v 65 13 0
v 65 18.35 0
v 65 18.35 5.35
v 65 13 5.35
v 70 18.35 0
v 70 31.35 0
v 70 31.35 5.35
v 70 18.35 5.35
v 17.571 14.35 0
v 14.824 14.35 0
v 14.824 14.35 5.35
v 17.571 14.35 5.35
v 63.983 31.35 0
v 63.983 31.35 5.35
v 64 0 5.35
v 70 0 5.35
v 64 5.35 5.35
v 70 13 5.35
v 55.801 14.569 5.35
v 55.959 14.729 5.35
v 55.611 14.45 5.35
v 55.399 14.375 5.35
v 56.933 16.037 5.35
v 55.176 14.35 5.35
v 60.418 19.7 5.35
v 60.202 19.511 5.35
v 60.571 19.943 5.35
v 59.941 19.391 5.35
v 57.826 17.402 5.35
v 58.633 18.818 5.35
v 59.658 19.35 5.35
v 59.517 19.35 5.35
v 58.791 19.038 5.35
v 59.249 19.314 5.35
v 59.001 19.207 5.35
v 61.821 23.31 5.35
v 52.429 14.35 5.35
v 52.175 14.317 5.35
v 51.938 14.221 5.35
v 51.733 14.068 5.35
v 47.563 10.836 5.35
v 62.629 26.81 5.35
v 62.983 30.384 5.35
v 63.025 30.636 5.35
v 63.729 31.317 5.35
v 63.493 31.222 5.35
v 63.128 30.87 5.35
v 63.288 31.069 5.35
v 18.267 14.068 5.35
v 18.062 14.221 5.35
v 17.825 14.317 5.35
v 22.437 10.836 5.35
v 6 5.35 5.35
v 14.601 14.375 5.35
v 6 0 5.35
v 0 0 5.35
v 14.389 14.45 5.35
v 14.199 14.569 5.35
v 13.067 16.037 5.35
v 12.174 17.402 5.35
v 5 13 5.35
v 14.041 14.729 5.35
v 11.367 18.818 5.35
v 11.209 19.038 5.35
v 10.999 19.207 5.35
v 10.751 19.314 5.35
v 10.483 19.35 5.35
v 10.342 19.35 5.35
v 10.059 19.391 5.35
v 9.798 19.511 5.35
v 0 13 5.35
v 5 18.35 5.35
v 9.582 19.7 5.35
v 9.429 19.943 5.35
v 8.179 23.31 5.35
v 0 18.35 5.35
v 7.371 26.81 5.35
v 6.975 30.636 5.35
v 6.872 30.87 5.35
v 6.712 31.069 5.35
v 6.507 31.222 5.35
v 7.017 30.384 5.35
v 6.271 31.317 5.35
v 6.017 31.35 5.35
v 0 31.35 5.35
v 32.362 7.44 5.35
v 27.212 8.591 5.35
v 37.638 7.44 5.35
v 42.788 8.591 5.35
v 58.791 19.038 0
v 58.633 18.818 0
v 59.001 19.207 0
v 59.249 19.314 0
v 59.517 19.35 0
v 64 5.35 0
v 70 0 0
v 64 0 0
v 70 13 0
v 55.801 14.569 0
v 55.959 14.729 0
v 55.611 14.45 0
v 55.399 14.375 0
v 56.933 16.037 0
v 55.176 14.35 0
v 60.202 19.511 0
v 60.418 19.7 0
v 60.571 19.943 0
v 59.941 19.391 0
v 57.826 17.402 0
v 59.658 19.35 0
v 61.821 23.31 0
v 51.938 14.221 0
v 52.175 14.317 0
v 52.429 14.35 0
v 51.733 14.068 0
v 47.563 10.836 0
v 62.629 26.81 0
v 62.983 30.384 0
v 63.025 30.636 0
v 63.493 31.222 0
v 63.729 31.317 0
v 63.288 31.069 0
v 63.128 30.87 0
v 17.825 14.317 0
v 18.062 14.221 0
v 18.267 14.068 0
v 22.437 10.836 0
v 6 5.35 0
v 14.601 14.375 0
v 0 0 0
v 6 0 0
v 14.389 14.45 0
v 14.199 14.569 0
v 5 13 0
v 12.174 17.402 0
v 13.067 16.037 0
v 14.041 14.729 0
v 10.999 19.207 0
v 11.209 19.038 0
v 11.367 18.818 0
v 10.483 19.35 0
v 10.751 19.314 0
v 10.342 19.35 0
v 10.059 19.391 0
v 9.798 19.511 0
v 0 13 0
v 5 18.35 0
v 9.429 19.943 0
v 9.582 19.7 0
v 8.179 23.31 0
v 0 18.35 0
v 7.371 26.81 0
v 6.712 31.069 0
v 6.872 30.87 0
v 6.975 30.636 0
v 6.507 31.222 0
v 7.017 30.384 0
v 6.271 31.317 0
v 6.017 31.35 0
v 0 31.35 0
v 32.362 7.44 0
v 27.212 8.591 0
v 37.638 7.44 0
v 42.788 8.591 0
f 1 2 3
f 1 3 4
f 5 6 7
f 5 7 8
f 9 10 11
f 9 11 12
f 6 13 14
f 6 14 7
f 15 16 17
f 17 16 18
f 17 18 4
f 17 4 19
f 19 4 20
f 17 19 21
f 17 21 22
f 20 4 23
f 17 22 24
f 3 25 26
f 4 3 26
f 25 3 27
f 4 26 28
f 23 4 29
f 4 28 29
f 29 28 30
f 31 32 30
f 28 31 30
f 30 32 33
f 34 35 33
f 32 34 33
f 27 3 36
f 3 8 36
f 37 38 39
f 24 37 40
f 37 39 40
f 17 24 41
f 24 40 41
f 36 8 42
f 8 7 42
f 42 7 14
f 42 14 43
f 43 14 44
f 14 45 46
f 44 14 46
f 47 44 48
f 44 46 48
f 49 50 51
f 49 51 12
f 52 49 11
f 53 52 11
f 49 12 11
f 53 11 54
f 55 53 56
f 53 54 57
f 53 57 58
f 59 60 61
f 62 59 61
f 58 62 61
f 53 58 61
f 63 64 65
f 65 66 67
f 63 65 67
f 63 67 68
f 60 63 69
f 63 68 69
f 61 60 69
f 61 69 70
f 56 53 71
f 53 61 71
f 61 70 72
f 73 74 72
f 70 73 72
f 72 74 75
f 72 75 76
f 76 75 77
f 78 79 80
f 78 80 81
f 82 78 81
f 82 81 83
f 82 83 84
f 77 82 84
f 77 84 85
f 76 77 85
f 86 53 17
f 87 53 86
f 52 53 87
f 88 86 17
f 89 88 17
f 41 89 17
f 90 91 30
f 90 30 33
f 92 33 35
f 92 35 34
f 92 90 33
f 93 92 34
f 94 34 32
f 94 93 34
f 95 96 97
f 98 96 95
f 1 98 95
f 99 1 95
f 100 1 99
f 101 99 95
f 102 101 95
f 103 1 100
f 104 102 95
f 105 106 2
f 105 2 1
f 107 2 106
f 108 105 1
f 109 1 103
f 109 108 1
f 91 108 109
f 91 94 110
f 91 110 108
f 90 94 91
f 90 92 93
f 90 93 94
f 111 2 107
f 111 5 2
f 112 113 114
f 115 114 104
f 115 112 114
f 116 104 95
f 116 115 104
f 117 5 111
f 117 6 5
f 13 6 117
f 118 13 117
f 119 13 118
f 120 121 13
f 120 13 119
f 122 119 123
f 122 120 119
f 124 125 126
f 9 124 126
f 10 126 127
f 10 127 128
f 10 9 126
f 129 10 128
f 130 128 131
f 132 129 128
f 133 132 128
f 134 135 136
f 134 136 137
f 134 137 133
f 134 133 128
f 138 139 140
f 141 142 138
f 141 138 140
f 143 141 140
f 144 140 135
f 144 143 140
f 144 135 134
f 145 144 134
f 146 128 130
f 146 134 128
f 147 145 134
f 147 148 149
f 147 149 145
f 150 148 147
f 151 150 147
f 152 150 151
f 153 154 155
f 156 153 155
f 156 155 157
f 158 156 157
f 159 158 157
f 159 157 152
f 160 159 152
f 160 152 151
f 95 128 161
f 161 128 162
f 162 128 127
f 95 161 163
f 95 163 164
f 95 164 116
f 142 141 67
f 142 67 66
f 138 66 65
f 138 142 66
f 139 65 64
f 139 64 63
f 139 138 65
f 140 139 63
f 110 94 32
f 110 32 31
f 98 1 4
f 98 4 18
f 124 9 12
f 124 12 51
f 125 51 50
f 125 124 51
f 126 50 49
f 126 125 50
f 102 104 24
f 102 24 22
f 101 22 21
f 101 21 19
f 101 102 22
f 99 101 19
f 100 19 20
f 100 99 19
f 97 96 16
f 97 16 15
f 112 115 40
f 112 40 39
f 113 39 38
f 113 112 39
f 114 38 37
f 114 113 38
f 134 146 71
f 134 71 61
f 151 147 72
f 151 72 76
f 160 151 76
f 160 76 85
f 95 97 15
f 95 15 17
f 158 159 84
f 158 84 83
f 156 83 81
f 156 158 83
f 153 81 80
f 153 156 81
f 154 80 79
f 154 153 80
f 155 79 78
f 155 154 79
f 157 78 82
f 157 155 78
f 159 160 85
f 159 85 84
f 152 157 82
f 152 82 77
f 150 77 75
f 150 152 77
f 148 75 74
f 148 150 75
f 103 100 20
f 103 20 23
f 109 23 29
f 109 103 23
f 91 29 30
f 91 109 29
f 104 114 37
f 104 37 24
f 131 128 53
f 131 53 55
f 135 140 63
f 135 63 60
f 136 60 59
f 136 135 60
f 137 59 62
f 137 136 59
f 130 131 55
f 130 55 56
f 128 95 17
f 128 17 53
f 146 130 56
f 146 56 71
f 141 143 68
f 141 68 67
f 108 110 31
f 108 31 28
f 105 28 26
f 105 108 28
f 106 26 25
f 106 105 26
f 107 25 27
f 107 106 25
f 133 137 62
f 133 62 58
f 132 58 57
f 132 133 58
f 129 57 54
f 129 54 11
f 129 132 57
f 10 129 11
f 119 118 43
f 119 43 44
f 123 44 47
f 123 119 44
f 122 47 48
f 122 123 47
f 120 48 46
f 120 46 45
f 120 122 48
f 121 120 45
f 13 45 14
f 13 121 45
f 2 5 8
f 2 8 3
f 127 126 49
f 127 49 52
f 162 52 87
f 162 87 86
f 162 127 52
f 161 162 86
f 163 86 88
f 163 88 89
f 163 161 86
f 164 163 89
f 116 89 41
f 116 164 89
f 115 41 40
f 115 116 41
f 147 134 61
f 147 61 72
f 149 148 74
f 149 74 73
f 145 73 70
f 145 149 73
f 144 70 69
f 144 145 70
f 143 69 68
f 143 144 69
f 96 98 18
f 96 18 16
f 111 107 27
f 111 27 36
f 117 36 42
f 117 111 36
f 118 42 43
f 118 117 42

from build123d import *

# Parameters (mm, degrees)
BOSS_EXTRUDE1_DEPTH = 5.35


with BuildPart() as part:
    # Model → Boss-Extrude1 (new body)
    with BuildSketch(Plane.XY):
        with BuildLine():
            Line((10.342343988, 19.35), (10.483423975, 19.35))
            ThreePointArc((10.483423975, 19.35), (10.998948723, 19.20687469), (11.366904192, 18.818468468))
            ThreePointArc((11.366904192, 18.818468468), (12.610215159, 16.712376055), (14.040684229, 14.728640777))
            ThreePointArc((14.040684229, 14.728640777), (14.389100425, 14.449622517), (14.824210053, 14.35))
            Line((14.824210053, 14.35), (17.571488159, 14.35))
            ThreePointArc((17.571488159, 14.35), (17.946708443, 14.276935671), (18.26709829, 14.068419477))
            ThreePointArc((18.26709829, 14.068419477), (35, 7.295), (51.73290171, 14.068419477))
            ThreePointArc((51.73290171, 14.068419477), (52.053291557, 14.276935671), (52.428511841, 14.35))
            Line((52.428511841, 14.35), (55.175789947, 14.35))
            ThreePointArc((55.175789947, 14.35), (55.610899575, 14.449622517), (55.959315771, 14.728640777))
            ThreePointArc((55.959315771, 14.728640777), (57.389784841, 16.712376055), (58.633095808, 18.818468468))
            ThreePointArc((58.633095808, 18.818468468), (59.001051277, 19.20687469), (59.516576025, 19.35))
            Line((59.516576025, 19.35), (59.657656012, 19.35))
            ThreePointArc((59.657656012, 19.35), (60.201987066, 19.511129507), (60.570902531, 19.942592593))
            ThreePointArc((60.570902531, 19.942592593), (62.28136196, 25.047041201), (62.9833482, 30.384482759))
            ThreePointArc((62.9833482, 30.384482759), (63.287945159, 31.069194952), (63.982753492, 31.35))
            Line((63.982753492, 31.35), (70, 31.35))
            Line((70, 31.35), (70, 18.35))
            Line((70, 18.35), (65, 18.35))
            Line((65, 18.35), (65, 13))
            Line((65, 13), (70, 13))
            Line((70, 13), (70, 0))
            Line((70, 0), (64, 0))
            Line((64, 0), (64, 5.35))
            Line((64, 5.35), (6, 5.35))
            Line((6, 5.35), (6, 0))
            Line((6, 0), (0, 0))
            Line((0, 0), (0, 13))
            Line((0, 13), (5, 13))
            Line((5, 13), (5, 18.35))
            Line((5, 18.35), (0, 18.35))
            Line((0, 18.35), (0, 31.35))
            Line((0, 31.35), (6.017246508, 31.35))
            ThreePointArc((6.017246508, 31.35), (6.712054841, 31.069194952), (7.0166518, 30.384482759))
            ThreePointArc((7.0166518, 30.384482759), (7.71863804, 25.047041201), (9.429097469, 19.942592593))
            ThreePointArc((9.429097469, 19.942592593), (9.798012934, 19.511129507), (10.342343988, 19.35))
        make_face()
    extrude(amount=BOSS_EXTRUDE1_DEPTH)


solid = part.part
